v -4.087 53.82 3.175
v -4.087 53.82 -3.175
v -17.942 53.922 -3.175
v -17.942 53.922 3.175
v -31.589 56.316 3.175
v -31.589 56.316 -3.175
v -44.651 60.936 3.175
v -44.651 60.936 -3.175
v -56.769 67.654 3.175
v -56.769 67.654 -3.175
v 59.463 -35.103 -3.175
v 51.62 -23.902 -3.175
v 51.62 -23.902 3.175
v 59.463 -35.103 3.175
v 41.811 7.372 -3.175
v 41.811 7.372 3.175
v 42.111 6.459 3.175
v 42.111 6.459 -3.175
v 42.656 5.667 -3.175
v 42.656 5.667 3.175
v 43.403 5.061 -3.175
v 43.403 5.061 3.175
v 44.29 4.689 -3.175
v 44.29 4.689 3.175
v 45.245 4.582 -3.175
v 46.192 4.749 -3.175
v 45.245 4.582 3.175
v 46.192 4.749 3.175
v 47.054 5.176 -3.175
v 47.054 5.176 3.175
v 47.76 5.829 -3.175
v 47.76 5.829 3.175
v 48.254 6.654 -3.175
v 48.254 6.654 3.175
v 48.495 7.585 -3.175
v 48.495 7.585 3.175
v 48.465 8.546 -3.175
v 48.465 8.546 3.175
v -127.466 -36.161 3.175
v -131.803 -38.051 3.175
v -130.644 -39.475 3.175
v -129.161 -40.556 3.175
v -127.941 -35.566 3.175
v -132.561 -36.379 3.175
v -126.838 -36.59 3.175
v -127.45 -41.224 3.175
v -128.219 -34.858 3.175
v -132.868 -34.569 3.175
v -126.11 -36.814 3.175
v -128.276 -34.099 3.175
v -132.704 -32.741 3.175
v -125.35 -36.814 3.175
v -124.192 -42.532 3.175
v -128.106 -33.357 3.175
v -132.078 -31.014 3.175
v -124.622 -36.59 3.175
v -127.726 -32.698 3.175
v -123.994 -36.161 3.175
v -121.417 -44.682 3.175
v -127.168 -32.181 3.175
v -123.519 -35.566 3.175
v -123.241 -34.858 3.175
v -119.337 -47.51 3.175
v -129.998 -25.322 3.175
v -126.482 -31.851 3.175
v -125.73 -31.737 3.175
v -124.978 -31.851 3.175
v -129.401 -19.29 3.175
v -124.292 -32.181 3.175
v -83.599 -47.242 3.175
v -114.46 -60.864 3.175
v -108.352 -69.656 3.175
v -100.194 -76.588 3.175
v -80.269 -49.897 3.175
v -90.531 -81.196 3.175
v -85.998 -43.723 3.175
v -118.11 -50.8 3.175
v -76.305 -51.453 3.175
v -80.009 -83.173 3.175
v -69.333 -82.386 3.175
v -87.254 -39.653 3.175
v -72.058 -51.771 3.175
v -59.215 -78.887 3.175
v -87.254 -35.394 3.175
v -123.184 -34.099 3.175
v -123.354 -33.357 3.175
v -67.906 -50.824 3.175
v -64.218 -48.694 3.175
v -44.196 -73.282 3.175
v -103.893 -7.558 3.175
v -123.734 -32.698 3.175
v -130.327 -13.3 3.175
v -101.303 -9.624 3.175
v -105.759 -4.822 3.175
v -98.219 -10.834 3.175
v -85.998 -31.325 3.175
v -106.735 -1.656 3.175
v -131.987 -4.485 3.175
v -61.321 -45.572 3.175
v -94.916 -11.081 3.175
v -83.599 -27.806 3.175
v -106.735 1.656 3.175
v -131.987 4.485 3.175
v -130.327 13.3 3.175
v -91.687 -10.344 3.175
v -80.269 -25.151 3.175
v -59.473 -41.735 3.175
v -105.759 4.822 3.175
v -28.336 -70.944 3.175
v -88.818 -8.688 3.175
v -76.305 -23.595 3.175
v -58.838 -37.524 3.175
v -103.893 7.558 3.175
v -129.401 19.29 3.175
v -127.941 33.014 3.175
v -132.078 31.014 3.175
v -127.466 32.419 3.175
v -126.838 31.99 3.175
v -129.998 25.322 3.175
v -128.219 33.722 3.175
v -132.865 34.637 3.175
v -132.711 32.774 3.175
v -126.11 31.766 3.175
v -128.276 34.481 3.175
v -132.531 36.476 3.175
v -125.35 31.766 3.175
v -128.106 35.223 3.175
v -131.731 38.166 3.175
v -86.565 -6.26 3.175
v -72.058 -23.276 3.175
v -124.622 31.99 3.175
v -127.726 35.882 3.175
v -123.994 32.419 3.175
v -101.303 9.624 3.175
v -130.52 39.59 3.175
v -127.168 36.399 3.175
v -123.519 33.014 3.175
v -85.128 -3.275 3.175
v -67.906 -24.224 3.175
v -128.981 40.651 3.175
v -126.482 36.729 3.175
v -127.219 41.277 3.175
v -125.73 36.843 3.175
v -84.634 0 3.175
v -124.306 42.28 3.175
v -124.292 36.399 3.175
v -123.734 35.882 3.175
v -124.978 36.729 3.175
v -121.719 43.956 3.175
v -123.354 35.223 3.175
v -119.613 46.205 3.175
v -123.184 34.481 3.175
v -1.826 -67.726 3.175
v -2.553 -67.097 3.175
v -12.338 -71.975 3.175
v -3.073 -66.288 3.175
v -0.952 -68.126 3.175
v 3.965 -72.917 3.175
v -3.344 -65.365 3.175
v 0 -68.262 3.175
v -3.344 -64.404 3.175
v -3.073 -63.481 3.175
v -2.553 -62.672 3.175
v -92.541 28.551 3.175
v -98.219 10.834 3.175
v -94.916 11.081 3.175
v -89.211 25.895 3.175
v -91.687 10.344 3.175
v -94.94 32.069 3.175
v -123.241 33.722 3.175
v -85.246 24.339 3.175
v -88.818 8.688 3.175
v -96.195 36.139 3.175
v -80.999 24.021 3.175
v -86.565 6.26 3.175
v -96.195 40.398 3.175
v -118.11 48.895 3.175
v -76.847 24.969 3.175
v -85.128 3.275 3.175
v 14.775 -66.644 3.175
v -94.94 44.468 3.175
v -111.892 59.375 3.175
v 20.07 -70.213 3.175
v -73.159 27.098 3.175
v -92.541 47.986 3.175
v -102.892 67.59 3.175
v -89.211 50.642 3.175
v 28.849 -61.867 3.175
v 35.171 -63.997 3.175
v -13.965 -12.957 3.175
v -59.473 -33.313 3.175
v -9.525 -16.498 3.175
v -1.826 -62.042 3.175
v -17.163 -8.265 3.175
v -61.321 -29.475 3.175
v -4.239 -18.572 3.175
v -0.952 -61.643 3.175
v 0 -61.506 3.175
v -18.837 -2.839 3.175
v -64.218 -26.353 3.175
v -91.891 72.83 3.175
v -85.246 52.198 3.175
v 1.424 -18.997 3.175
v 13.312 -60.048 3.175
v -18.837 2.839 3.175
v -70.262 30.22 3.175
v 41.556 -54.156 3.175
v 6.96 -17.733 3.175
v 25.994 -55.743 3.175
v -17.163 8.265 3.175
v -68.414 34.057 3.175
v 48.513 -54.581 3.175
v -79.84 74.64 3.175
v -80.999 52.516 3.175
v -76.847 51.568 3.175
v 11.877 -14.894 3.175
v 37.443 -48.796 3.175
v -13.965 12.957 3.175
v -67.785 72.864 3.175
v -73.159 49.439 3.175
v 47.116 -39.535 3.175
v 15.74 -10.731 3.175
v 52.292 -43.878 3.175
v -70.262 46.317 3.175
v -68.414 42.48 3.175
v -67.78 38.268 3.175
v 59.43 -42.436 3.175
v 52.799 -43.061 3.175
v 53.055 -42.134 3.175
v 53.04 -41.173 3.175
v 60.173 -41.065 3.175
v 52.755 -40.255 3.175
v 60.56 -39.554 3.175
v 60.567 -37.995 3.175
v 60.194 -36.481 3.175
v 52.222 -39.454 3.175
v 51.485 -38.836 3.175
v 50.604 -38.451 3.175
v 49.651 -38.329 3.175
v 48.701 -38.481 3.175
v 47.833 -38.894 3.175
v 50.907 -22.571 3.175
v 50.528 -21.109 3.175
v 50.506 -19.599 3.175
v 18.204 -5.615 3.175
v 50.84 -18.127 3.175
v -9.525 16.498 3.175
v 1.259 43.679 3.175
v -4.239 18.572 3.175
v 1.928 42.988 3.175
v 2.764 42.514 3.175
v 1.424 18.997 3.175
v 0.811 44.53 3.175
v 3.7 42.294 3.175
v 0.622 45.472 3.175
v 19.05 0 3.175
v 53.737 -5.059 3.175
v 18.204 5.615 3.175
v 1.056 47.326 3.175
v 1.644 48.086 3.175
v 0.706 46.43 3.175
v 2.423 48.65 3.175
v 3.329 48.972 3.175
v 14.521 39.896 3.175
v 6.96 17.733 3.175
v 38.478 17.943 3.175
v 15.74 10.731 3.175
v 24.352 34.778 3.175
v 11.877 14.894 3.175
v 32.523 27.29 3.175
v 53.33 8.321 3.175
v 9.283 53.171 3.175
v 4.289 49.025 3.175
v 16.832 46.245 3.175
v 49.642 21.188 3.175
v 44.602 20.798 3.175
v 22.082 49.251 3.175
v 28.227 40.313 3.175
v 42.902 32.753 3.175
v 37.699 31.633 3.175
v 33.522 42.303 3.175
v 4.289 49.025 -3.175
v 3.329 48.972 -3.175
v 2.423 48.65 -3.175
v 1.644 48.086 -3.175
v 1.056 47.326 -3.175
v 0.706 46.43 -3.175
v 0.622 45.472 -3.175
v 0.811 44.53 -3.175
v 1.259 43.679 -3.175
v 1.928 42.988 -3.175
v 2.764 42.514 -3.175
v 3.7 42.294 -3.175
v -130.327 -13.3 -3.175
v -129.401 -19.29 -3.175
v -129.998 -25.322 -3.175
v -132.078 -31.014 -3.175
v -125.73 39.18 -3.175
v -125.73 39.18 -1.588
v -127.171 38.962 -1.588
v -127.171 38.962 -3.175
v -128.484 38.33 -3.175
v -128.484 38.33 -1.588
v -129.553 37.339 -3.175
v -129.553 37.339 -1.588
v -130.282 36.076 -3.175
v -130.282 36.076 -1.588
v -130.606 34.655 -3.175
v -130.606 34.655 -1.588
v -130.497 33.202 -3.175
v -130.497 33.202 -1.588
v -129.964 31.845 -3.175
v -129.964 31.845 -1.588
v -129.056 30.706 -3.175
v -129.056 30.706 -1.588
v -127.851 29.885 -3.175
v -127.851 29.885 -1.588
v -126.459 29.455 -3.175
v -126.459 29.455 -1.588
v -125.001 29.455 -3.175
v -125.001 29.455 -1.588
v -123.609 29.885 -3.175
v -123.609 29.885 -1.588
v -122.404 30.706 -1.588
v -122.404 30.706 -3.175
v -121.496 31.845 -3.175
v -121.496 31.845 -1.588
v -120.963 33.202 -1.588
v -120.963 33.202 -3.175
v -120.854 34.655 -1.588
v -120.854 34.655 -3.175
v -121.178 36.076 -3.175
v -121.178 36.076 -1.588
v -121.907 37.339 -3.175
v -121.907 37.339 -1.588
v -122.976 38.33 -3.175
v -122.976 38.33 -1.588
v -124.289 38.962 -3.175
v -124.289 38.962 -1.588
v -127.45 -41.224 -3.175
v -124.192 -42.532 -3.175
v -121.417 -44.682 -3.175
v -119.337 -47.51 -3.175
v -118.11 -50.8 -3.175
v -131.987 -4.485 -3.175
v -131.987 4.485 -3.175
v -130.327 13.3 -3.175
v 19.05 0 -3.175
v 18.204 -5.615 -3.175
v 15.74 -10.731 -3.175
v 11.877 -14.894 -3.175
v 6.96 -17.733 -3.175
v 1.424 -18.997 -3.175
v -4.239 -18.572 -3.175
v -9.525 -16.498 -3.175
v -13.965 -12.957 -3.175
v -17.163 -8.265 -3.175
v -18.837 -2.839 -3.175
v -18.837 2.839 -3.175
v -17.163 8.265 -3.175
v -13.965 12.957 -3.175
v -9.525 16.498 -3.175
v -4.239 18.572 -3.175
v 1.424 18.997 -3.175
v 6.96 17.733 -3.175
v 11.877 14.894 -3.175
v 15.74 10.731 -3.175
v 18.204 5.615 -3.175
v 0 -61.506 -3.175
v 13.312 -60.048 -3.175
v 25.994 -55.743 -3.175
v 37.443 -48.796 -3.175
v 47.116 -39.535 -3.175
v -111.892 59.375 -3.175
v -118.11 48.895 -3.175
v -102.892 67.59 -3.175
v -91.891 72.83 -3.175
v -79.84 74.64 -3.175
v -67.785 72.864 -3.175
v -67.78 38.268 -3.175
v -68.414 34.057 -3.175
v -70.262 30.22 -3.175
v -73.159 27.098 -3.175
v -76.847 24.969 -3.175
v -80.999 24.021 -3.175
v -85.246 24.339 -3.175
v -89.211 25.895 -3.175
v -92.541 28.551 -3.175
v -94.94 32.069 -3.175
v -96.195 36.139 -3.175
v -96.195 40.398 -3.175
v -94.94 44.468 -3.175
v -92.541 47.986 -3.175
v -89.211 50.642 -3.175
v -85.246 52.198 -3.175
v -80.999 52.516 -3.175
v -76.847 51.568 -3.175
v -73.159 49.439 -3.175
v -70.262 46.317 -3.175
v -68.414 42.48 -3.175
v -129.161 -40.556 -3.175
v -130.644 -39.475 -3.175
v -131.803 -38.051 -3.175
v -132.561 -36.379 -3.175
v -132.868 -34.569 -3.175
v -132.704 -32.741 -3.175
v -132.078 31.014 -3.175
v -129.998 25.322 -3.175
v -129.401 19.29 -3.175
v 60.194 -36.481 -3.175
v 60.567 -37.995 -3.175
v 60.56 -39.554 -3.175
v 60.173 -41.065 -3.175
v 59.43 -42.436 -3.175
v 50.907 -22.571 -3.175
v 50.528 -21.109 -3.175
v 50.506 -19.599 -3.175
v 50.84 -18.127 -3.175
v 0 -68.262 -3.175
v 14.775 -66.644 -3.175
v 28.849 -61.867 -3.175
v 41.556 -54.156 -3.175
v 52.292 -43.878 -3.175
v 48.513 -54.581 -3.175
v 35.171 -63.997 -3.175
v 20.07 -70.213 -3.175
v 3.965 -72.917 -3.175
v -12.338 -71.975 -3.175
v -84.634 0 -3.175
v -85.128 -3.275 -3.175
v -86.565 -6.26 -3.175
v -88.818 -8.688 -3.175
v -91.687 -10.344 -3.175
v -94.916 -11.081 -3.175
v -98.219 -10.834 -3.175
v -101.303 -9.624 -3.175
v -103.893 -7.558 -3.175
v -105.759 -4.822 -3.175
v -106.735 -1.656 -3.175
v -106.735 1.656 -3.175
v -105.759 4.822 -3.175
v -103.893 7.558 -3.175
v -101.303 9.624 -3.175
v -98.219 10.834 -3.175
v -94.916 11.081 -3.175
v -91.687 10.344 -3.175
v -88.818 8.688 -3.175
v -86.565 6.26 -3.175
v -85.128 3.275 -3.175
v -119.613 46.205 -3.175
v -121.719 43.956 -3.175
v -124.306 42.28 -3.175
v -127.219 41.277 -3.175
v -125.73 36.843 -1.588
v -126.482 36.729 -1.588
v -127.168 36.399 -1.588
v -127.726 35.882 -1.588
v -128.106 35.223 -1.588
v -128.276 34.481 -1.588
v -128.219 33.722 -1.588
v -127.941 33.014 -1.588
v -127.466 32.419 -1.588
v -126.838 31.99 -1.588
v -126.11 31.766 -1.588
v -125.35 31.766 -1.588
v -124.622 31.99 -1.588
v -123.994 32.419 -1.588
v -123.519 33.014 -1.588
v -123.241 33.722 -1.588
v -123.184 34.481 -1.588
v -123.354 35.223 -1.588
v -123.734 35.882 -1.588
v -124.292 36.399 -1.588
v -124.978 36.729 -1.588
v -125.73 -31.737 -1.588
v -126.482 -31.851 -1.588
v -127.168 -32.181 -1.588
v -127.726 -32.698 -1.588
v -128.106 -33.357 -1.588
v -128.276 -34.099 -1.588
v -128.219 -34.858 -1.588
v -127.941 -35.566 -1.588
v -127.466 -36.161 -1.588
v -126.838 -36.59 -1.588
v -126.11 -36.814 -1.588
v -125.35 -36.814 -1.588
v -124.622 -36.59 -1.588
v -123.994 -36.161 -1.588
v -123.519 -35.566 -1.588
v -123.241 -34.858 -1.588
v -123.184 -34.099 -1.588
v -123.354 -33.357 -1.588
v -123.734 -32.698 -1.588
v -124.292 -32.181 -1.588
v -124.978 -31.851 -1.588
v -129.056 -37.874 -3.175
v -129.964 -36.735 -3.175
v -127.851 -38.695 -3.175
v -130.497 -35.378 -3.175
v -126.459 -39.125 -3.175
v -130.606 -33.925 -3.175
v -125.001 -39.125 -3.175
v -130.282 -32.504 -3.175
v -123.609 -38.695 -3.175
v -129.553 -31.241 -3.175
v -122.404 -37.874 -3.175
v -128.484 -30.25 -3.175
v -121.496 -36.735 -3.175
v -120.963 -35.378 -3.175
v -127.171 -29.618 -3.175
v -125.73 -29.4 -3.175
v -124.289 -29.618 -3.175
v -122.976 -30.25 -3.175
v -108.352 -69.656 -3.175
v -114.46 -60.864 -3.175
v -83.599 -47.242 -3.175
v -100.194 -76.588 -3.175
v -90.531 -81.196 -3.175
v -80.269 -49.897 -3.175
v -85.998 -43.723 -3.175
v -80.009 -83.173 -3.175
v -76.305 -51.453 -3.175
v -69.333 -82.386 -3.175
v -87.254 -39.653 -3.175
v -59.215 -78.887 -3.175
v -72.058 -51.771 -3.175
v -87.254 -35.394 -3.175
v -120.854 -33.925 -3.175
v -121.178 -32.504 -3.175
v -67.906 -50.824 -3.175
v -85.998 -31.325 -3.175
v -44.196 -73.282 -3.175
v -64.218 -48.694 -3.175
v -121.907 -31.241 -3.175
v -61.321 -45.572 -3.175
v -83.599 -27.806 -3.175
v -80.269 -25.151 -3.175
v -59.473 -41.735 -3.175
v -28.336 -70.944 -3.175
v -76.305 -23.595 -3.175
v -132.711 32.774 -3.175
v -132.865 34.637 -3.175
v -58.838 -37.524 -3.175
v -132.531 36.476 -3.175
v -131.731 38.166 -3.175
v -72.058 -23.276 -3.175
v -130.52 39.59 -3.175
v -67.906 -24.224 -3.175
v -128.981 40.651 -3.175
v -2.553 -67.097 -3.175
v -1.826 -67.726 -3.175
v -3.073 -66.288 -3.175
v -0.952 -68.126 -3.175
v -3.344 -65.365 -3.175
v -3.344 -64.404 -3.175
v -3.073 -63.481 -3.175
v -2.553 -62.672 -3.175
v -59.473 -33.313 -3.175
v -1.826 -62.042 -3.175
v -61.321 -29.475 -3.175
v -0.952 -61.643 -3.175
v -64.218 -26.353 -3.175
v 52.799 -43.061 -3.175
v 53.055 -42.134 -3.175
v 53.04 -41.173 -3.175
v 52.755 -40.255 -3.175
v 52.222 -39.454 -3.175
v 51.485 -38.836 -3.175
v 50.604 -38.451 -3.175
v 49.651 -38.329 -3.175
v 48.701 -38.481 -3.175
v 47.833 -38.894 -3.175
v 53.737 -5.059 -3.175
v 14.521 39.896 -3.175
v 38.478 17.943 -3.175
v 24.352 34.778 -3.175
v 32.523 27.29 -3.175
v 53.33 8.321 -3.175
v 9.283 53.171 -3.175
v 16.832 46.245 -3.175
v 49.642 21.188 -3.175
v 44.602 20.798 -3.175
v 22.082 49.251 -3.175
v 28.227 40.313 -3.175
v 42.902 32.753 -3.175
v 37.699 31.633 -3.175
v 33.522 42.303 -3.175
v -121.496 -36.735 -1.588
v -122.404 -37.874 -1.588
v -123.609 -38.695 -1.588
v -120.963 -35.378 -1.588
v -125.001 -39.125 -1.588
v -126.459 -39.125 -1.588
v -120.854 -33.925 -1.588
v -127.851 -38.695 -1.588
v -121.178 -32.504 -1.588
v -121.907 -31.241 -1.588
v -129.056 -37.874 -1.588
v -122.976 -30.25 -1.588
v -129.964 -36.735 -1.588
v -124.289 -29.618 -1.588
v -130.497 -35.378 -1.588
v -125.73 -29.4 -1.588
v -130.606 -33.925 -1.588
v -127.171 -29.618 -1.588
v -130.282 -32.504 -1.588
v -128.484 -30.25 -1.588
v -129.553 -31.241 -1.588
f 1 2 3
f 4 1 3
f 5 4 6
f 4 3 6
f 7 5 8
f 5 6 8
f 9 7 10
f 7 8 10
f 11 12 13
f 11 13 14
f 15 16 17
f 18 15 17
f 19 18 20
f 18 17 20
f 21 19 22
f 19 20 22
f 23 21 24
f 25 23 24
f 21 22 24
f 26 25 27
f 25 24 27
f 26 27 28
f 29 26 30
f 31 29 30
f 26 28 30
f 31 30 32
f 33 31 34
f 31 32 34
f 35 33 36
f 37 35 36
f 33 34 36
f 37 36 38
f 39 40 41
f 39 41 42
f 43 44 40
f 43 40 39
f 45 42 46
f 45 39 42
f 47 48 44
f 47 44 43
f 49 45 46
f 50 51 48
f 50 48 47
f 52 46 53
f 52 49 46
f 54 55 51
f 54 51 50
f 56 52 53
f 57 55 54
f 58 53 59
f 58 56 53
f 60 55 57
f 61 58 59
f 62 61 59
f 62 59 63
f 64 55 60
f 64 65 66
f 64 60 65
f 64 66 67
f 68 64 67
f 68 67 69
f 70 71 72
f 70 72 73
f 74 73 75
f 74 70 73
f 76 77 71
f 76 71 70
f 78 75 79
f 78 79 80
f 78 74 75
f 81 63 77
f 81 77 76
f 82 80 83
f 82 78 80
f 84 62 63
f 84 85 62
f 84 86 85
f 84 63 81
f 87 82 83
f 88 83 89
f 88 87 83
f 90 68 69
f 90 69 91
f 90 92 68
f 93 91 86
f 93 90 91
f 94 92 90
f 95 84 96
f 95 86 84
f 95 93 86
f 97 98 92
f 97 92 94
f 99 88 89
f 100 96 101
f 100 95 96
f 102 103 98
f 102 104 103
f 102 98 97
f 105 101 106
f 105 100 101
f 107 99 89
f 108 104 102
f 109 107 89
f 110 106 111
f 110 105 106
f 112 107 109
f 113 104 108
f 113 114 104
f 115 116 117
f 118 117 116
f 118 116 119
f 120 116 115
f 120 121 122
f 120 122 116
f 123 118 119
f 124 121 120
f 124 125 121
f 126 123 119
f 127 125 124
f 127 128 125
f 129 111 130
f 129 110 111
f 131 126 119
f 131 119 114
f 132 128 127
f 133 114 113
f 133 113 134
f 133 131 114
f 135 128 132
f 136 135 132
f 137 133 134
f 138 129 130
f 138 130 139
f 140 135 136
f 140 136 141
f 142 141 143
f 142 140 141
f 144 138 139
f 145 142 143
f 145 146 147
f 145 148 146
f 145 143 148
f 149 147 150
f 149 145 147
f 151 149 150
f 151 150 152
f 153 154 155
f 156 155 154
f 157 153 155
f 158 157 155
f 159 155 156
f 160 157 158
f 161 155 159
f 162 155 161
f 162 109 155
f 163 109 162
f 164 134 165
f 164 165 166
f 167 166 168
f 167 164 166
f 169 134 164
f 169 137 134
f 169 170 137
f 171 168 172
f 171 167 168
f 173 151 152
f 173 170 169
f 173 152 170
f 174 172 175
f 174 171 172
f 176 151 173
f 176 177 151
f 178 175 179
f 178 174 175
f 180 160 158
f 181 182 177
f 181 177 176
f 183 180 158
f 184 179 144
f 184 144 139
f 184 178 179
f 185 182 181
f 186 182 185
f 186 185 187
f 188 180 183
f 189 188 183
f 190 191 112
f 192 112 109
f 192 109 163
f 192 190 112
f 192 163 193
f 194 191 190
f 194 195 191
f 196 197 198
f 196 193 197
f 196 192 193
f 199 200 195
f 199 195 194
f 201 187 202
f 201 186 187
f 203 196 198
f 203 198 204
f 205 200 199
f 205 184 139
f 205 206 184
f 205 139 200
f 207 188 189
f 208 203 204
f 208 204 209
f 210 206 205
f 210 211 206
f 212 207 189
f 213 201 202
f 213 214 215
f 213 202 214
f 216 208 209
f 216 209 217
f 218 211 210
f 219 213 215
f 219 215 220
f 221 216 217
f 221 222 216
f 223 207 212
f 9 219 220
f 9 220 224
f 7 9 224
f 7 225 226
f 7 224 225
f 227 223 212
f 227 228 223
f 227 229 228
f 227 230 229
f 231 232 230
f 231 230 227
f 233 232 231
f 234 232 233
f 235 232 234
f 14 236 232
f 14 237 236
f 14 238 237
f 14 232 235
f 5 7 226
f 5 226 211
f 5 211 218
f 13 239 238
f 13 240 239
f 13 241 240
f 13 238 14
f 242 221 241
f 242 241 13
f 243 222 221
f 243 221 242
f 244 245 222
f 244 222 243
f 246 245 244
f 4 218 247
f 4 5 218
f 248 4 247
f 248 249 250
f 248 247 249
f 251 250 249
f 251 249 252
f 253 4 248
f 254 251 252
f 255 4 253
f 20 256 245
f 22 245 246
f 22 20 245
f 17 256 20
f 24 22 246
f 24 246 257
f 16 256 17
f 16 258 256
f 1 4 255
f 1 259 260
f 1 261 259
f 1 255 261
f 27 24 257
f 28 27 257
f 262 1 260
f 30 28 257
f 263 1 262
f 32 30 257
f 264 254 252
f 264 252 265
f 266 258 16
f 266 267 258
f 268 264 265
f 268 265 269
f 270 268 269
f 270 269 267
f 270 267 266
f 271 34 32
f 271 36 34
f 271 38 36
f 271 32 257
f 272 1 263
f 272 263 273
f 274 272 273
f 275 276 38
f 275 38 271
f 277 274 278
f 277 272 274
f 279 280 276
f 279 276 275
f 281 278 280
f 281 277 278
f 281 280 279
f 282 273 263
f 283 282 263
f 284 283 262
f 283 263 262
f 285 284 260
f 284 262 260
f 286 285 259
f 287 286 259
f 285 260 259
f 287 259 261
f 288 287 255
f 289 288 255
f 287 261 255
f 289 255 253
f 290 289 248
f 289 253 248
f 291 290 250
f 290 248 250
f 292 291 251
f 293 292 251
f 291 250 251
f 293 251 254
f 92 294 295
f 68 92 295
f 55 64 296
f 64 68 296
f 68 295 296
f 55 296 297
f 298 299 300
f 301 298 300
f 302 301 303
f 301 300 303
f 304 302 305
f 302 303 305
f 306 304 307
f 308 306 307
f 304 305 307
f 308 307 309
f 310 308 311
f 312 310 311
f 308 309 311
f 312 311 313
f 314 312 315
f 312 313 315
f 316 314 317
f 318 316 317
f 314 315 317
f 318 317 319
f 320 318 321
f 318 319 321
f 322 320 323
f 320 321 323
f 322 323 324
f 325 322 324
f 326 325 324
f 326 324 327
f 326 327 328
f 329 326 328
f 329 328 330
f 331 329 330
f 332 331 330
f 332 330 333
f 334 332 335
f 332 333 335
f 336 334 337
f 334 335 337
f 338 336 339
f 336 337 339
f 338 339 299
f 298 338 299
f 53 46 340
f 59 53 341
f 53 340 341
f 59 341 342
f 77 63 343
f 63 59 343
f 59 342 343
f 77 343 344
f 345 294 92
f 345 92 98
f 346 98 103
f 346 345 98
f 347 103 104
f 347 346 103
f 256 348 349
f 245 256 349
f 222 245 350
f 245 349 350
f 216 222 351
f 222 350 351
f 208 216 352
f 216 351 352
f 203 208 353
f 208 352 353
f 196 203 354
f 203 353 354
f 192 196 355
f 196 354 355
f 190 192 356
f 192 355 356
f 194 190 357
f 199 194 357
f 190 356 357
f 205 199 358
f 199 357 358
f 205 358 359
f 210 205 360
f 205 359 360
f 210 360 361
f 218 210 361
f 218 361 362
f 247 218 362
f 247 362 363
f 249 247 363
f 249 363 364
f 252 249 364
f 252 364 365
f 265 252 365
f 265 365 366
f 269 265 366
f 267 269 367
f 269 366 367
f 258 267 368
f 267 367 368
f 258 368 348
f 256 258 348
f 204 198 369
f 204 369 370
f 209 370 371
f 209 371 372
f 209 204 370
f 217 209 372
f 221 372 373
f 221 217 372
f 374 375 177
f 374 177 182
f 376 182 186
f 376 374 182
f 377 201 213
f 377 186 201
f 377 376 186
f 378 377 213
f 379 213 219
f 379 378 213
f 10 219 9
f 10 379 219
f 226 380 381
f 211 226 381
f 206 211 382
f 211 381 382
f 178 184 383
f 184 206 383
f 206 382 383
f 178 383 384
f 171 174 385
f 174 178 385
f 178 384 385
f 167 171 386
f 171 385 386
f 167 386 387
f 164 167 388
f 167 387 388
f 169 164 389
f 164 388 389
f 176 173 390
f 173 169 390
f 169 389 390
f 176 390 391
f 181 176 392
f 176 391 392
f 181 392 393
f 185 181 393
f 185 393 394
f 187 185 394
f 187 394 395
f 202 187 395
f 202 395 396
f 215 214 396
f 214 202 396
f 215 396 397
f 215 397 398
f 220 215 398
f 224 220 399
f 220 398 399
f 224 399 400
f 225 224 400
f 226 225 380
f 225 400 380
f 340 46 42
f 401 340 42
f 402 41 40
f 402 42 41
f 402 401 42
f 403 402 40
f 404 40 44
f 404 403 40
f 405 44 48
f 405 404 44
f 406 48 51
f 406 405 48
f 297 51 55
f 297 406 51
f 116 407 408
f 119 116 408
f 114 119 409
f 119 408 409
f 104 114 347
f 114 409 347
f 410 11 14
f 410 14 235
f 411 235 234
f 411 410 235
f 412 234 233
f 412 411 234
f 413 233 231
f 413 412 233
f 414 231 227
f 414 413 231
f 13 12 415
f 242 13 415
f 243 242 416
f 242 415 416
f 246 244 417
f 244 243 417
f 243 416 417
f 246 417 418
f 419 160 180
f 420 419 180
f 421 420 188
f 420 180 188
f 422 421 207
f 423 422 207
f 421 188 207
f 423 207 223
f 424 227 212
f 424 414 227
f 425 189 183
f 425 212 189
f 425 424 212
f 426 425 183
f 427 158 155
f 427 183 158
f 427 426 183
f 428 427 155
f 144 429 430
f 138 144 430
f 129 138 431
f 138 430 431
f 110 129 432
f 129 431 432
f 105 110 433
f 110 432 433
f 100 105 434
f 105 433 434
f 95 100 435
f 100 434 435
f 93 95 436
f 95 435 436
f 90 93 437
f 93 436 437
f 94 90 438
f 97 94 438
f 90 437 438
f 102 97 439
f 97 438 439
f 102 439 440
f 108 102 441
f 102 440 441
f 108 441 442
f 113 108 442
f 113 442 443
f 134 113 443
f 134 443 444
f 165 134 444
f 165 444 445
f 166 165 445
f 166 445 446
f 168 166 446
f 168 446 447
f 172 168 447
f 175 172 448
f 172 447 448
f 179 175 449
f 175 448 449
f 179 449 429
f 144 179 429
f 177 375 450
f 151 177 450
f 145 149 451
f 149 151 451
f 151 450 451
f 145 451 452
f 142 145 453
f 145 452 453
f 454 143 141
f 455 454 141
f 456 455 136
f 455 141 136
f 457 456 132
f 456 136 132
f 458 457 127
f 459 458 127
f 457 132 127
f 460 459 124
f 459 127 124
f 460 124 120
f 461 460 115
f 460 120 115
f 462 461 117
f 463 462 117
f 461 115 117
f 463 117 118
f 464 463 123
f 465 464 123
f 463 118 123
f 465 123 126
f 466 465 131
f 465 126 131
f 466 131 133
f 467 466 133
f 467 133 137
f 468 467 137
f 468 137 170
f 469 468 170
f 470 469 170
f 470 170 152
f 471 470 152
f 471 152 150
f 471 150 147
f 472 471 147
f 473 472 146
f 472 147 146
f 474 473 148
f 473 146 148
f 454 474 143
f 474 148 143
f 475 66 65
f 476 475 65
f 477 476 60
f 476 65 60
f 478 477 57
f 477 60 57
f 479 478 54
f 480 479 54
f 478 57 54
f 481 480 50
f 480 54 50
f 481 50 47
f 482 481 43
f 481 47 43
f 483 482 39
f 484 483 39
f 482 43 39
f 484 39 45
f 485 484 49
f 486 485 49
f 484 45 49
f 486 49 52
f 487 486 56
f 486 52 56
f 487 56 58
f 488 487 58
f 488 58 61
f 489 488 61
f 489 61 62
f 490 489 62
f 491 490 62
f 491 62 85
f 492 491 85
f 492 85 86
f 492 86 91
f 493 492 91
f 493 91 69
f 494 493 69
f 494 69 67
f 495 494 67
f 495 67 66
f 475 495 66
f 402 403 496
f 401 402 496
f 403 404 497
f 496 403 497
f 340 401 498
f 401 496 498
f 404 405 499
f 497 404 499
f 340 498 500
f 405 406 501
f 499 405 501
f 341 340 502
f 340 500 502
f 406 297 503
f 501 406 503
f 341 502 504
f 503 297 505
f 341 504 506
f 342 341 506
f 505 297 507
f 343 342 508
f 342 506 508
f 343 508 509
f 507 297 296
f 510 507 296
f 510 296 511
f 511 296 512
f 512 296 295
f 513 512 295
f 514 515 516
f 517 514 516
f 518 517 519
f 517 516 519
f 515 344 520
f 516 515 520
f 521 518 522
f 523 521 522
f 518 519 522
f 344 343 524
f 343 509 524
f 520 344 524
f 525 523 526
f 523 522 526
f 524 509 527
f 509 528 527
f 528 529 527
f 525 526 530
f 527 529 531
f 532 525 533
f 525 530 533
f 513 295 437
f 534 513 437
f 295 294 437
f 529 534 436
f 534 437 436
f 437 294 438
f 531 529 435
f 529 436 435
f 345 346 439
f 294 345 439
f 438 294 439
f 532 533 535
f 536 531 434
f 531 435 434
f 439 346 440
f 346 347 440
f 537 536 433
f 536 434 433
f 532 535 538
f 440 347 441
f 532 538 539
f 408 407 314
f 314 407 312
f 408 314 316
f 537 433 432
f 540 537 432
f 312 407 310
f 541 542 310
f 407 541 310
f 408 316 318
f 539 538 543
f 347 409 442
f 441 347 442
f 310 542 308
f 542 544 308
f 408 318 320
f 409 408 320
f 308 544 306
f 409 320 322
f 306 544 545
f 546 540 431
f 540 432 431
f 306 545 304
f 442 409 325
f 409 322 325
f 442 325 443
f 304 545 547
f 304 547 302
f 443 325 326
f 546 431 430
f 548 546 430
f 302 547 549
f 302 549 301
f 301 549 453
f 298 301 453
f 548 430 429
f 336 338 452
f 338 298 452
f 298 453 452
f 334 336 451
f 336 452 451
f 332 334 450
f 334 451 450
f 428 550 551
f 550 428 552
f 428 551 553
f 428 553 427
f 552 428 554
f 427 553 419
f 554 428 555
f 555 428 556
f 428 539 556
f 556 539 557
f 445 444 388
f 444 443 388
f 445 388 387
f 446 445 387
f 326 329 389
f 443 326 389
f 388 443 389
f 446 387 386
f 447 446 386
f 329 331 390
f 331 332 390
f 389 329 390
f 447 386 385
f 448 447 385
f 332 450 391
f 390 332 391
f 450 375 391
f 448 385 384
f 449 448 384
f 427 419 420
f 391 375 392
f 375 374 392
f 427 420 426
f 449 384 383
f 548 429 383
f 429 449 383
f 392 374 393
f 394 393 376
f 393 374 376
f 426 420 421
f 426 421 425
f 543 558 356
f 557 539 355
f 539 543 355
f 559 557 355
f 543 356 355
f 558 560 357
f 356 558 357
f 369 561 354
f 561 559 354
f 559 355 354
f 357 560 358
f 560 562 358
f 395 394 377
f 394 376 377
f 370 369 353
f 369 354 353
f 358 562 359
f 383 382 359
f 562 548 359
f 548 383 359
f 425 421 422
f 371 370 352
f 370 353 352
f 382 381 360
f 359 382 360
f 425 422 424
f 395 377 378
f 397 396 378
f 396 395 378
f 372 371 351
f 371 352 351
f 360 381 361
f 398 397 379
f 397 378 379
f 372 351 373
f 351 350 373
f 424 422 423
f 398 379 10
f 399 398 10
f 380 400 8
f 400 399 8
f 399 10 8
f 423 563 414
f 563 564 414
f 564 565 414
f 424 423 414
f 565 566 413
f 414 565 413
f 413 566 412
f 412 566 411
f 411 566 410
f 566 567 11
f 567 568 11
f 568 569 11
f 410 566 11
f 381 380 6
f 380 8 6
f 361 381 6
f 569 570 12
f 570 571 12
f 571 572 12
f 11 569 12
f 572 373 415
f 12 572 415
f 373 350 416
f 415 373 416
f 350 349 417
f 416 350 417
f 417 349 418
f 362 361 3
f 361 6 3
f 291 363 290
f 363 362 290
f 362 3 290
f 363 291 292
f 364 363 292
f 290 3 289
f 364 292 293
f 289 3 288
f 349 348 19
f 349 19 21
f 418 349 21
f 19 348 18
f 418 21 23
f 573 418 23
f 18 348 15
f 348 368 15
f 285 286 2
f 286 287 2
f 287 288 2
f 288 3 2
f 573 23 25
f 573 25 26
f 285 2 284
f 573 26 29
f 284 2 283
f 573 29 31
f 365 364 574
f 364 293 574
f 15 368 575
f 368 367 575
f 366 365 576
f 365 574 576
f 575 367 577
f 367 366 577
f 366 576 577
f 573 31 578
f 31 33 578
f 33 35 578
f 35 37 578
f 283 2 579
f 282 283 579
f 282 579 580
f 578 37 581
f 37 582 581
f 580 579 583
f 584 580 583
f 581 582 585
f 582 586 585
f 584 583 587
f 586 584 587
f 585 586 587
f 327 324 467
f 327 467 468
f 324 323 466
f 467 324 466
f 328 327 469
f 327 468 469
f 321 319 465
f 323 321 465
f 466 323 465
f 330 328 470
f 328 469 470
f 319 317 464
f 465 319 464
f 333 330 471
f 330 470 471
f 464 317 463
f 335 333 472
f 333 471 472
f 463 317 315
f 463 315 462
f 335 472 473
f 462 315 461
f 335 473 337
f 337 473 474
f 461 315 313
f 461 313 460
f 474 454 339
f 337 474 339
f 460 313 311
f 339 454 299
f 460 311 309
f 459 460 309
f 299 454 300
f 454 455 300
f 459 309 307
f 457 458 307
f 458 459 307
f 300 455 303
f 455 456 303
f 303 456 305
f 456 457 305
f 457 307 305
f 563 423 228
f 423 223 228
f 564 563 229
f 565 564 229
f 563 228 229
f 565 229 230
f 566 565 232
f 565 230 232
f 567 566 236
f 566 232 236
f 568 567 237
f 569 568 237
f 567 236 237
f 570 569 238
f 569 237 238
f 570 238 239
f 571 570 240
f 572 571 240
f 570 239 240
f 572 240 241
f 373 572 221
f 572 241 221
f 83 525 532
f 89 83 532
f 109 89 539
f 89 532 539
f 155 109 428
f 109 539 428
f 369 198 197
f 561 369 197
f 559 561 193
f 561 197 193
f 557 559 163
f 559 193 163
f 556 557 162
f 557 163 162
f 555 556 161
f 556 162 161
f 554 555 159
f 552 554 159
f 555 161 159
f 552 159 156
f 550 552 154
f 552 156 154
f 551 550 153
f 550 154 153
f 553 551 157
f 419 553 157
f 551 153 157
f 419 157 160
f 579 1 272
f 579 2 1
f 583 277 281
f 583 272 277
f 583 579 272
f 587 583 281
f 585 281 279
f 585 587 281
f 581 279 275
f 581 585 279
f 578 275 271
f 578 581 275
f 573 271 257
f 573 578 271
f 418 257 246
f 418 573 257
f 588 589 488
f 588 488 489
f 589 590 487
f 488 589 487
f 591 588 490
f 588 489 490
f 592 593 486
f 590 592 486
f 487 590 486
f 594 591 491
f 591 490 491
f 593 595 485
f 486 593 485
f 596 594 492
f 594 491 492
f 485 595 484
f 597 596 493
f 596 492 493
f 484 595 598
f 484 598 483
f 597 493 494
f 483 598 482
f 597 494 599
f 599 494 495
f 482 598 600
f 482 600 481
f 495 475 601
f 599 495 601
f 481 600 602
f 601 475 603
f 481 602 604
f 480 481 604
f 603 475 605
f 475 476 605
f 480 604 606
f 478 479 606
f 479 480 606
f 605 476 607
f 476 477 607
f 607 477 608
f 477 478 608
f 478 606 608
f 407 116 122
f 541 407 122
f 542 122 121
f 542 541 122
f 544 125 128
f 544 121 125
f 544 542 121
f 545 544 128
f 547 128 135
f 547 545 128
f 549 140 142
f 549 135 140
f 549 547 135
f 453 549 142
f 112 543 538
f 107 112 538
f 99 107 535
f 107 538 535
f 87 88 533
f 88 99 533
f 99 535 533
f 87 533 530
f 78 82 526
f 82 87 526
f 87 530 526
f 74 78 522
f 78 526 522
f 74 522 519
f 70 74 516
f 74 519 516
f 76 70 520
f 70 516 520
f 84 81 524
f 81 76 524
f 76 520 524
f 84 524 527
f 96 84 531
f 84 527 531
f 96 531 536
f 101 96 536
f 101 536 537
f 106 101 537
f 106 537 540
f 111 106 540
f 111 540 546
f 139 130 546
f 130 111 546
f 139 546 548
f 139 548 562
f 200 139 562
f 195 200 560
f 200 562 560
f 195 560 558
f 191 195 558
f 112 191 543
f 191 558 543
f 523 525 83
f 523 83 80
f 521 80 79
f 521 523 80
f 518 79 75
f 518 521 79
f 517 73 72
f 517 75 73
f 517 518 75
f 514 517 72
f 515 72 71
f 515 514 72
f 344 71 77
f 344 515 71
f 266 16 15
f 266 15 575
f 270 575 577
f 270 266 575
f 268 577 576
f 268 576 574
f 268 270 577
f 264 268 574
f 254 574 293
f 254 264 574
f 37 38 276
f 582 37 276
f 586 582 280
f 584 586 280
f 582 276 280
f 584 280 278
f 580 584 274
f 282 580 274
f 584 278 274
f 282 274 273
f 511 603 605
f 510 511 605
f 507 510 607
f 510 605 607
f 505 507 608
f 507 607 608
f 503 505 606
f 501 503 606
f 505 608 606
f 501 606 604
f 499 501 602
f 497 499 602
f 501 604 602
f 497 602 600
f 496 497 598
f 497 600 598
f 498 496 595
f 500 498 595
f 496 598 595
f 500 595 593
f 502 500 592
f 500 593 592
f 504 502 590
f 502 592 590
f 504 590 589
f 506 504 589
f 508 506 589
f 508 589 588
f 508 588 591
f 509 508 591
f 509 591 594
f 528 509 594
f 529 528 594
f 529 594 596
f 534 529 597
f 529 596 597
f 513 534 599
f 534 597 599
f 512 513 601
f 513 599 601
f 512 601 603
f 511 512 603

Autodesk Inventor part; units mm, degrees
ref_plane "YZ Plane" through (0, 0, 0) normal (1, 0, 0) x (0, 1, 0)
ref_plane "XZ Plane" through (0, 0, 0) normal (0, 1, 0) x (-1, 0, 0)
ref_plane "XY Plane" through (0, 0, 0) normal (0, 0, 1) x (1, 0, 0)
sketch "Sketch1" plane through (0, 0, 0) normal (0, 0, 1) x (1, 0, 0)
  line L0 (-198.2999, 0) -> (115.1427, 0) projected
  line L1 (0, -203.8942) -> (0, 193.807) projected
  circle A0 centre (0, 0) radius 53.975 construction
  circle A1 centre (0, 0) radius 19.05
  arc A2 (50.8401, -18.1268) -> (-4.087, 53.82) centre (0, 0) ccw
  line L2 (51.6197, -23.9016) -> (59.4633, -35.1034)
  arc A3 (50.8401, -18.1268) -> (51.6197, -23.9016) centre (56.8213, -20.2594) ccw
  line L3 (0, 0) -> (-57.7807, -26.9436) construction
  circle A4 centre (0, 0) radius 53.975 construction
  circle A5 centre (-95.7467, 0) radius 11.1125
  circle A6 centre (-73.1257, -37.5239) radius 14.2875
  circle A7 centre (-82.0671, 38.2685) radius 14.2875
  arc A8 (-56.7688, 67.6544) -> (-118.11, 48.895) centre (-79.7827, 33.238) ccw
  arc A9 (-118.11, -50.8) -> (-59.2151, -78.8871) centre (-77.6901, -41.8358) ccw
  arc A10 (-12.3378, -71.9752) -> (-59.2151, -78.8871) centre (-25.2121, -147.0797) ccw
  circle A11 centre (0, 0) radius 16.51 construction
  line L4 (0, 0) -> (-82.0671, 38.2685) construction
  circle A12 centre (-125.73, 34.29) radius 6.35 construction
  circle A13 centre (-125.73, -34.29) radius 6.35 construction
  line L5 (0, 0) -> (-34.422, 64.7383) construction
  line L6 (0, 0) -> (-56.7688, 67.6544) construction
  arc A14 (-127.2193, 41.2768) -> (-132.0785, 31.0144) centre (-125.73, 34.29) ccw
  arc A15 (-130.3268, 13.3001) -> (-130.3268, -13.3001) centre (-83.9357, 0) ccw
  arc A16 (-130.3268, 13.3001) -> (-132.0785, 31.0144) centre (-153.5223, 19.9501) ccw
  arc A17 (-132.0785, -31.0144) -> (-127.4503, -41.2235) centre (-125.73, -34.29) ccw
  arc A18 (-132.0785, -31.0144) -> (-130.3268, -13.3001) centre (-153.5223, -19.9501) ccw
  arc A19 (-118.11, -50.8) -> (-127.4503, -41.2235) centre (-130.5087, -53.5498) ccw
  arc A20 (-127.2193, 41.2768) -> (-118.11, 48.895) centre (-129.8669, 53.6978) ccw
  line L7 (-198.2999, 0) -> (115.1427, 0) projected
  line L8 (0, 193.807) -> (0, -203.8942) projected
  line L9 (-118.11, -50.8) -> (0, -50.8) construction
  arc A21 (-12.3378, -71.9752) -> (59.4295, -42.4357) centre (0, 0) ccw
  arc A22 (59.4295, -42.4357) -> (59.4633, -35.1034) centre (54.2617, -38.7456) ccw
  line L10 (0, 0) -> (41.8854, -59.8186) construction
  line L11 (-118.11, 48.895) -> (0, 48.895) construction
  arc A23 (-56.7688, 67.6544) -> (-4.087, 53.82) centre (-10.4031, 136.9926) ccw
  point P0 (61.9528, -38.6588)
  point P1 (-67.9722, -26.6913)
  dimension "d67" = 107.95
  dimension "d68" = 38.1
  dimension "d84" = 65
  dimension "d88" = 107.95
  dimension "d89" = 22.225
  dimension "d90" = 28.575
  dimension "d99" = 33.02
  dimension "d100" = 43.815
  dimension "d103" = 28.575
  dimension "d105" = 90.551
  dimension "d106" = 12.7
  dimension "d107" = 12.7
  dimension "d114" = 14.2875
  dimension "d115" = 14.2875
  dimension "d117" = 24.13
  dimension "d118" = 24.13
  dimension "d119" = 48.26
  dimension "d120" = 12.7
  dimension "d124" = 76.2
  dimension "d127" = 28
  dimension "d128" = 40
  dimension "d129" = 65
  dimension "d130" = 40.64
  dimension "d131" = 34.29
  dimension "d132" = 34.29
  dimension "d133" = 125.73
  dimension "d134" = 125.73
  dimension "d138" = 11.811
  dimension "d140" = 50.8
  dimension "d141" = 118.11
  dimension "d153" = 35
  dimension "d154" = 6.35
  dimension "d155" = 6.35
  dimension "d167" = 73.025
  dimension "d168" = 28.575
  dimension "d169" = 12.7
  dimension "d170" = 41.402
  dimension "d173" = 118.11
  dimension "d174" = 48.895
extrude "Base" add sketch "Sketch1" along normal mid plane 6.35 contours A15 A16 A14 A20 A8 A23 A2 L1 A1 L0 A5 | L0 A5 A1 L1 A21 A10 A9 A19 A17 A18 A15 | L1 A2 L0 A1 | A1 L0 A2 A3 L2 A22 A21 L1
sketch "Sketch2" plane through (0, 0, -3.175) normal (0, 0, -1) x (-1, 0, 0)
  arc A0 (127.4503, -41.2235) -> (132.0785, -31.0144) centre (125.73, -34.29) ccw projected
  arc A1 (132.0785, 31.0144) -> (127.2193, 41.2768) centre (125.73, 34.29) ccw projected
hole "Standoff holes to back plate" at (-125.73, 34.29, -3.175) at (-125.73, -34.29, -3.175) direction (0, 0, 1) diameter 5.1054 end through all counterbore diameter 9.779 counterbore depth 1.5875 clearance for "Flat Head Machine Screw (82)" size "#10" standard "Ansi Unified Screw Threads"
sketch "Sketch3" plane through (0, 0, 3.175) normal (0, 0, 1) x (1, 0, 0)
  arc A0 (-12.3378, -71.9752) -> (59.4295, -42.4357) centre (0, 0) ccw projected
  line L0 (51.6197, -23.9016) -> (59.4633, -35.1034) projected
  arc A1 (50.8401, -18.1268) -> (-4.087, 53.82) centre (0, 0) ccw projected
  line L1 (-173.5215, 0) -> (111.013, 0) projected
  line L2 (0, -114.8134) -> (0, 106.2156) projected
  arc A2 (0, -61.5061) -> (47.1164, -39.5354) centre (0, 0) ccw
  arc A3 (52.2921, -43.8783) -> (47.1164, -39.5354) centre (49.7043, -41.7068) ccw
  arc A4 (0, -61.5061) -> (0, -68.2625) centre (0, -64.8843) ccw
  arc A5 (0, -68.2625) -> (52.2921, -43.8783) centre (0, 0) ccw
  line L3 (49.7043, -41.7068) -> (0, 0) construction
  line L4 (0, -64.8843) -> (0, 0) construction
  point P0 (-10.4819, 52.9474)
  dimension "d159" = 4.7625
  dimension "d160" = 6.7564
  dimension "d161" = 15
  dimension "d162" = 50
extrude "Tensioning Slot" cut sketch "Sketch3" against normal through all contours A2 A3 A5 L2 | L2 A4
sketch "Sketch4" plane through (0, 0, 3.175) normal (0, 0, 1) x (1, 0, 0)
  arc A0 (50.8401, -18.1268) -> (-4.087, 53.82) centre (0, 0) ccw projected
  arc A1 (-12.3378, -71.9752) -> (59.4295, -42.4357) centre (0, 0) ccw projected
  line L0 (-173.5215, 0) -> (111.013, 0) projected
  line L1 (0, -114.8134) -> (0, 106.2156) projected
  arc A2 (41.8111, 7.3724) -> (48.4649, 8.5457) centre (45.138, 7.959) ccw
  arc A3 (4.2892, 49.0252) -> (3.7003, 42.2945) centre (3.9947, 45.6599) ccw
  arc A4 (41.8111, 7.3724) -> (3.7003, 42.2945) centre (0, 0) ccw
  arc A5 (48.4649, 8.5457) -> (4.2892, 49.0252) centre (0, 0) ccw
  line L2 (0, 0) -> (3.9947, 45.6599) construction
  line L3 (0, 0) -> (45.138, 7.959) construction
  dimension "d181" = 4.7625
  dimension "d182" = 6.7564
  dimension "d183" = 75
  dimension "d187" = 10
extrude "Tensioning Slot:2" cut sketch "Sketch4" against normal through all contours A4 A3 A5 A2
equation "\"d132\" = d131"
equation "\"d134\" = d133"
properties part number "front plate"
